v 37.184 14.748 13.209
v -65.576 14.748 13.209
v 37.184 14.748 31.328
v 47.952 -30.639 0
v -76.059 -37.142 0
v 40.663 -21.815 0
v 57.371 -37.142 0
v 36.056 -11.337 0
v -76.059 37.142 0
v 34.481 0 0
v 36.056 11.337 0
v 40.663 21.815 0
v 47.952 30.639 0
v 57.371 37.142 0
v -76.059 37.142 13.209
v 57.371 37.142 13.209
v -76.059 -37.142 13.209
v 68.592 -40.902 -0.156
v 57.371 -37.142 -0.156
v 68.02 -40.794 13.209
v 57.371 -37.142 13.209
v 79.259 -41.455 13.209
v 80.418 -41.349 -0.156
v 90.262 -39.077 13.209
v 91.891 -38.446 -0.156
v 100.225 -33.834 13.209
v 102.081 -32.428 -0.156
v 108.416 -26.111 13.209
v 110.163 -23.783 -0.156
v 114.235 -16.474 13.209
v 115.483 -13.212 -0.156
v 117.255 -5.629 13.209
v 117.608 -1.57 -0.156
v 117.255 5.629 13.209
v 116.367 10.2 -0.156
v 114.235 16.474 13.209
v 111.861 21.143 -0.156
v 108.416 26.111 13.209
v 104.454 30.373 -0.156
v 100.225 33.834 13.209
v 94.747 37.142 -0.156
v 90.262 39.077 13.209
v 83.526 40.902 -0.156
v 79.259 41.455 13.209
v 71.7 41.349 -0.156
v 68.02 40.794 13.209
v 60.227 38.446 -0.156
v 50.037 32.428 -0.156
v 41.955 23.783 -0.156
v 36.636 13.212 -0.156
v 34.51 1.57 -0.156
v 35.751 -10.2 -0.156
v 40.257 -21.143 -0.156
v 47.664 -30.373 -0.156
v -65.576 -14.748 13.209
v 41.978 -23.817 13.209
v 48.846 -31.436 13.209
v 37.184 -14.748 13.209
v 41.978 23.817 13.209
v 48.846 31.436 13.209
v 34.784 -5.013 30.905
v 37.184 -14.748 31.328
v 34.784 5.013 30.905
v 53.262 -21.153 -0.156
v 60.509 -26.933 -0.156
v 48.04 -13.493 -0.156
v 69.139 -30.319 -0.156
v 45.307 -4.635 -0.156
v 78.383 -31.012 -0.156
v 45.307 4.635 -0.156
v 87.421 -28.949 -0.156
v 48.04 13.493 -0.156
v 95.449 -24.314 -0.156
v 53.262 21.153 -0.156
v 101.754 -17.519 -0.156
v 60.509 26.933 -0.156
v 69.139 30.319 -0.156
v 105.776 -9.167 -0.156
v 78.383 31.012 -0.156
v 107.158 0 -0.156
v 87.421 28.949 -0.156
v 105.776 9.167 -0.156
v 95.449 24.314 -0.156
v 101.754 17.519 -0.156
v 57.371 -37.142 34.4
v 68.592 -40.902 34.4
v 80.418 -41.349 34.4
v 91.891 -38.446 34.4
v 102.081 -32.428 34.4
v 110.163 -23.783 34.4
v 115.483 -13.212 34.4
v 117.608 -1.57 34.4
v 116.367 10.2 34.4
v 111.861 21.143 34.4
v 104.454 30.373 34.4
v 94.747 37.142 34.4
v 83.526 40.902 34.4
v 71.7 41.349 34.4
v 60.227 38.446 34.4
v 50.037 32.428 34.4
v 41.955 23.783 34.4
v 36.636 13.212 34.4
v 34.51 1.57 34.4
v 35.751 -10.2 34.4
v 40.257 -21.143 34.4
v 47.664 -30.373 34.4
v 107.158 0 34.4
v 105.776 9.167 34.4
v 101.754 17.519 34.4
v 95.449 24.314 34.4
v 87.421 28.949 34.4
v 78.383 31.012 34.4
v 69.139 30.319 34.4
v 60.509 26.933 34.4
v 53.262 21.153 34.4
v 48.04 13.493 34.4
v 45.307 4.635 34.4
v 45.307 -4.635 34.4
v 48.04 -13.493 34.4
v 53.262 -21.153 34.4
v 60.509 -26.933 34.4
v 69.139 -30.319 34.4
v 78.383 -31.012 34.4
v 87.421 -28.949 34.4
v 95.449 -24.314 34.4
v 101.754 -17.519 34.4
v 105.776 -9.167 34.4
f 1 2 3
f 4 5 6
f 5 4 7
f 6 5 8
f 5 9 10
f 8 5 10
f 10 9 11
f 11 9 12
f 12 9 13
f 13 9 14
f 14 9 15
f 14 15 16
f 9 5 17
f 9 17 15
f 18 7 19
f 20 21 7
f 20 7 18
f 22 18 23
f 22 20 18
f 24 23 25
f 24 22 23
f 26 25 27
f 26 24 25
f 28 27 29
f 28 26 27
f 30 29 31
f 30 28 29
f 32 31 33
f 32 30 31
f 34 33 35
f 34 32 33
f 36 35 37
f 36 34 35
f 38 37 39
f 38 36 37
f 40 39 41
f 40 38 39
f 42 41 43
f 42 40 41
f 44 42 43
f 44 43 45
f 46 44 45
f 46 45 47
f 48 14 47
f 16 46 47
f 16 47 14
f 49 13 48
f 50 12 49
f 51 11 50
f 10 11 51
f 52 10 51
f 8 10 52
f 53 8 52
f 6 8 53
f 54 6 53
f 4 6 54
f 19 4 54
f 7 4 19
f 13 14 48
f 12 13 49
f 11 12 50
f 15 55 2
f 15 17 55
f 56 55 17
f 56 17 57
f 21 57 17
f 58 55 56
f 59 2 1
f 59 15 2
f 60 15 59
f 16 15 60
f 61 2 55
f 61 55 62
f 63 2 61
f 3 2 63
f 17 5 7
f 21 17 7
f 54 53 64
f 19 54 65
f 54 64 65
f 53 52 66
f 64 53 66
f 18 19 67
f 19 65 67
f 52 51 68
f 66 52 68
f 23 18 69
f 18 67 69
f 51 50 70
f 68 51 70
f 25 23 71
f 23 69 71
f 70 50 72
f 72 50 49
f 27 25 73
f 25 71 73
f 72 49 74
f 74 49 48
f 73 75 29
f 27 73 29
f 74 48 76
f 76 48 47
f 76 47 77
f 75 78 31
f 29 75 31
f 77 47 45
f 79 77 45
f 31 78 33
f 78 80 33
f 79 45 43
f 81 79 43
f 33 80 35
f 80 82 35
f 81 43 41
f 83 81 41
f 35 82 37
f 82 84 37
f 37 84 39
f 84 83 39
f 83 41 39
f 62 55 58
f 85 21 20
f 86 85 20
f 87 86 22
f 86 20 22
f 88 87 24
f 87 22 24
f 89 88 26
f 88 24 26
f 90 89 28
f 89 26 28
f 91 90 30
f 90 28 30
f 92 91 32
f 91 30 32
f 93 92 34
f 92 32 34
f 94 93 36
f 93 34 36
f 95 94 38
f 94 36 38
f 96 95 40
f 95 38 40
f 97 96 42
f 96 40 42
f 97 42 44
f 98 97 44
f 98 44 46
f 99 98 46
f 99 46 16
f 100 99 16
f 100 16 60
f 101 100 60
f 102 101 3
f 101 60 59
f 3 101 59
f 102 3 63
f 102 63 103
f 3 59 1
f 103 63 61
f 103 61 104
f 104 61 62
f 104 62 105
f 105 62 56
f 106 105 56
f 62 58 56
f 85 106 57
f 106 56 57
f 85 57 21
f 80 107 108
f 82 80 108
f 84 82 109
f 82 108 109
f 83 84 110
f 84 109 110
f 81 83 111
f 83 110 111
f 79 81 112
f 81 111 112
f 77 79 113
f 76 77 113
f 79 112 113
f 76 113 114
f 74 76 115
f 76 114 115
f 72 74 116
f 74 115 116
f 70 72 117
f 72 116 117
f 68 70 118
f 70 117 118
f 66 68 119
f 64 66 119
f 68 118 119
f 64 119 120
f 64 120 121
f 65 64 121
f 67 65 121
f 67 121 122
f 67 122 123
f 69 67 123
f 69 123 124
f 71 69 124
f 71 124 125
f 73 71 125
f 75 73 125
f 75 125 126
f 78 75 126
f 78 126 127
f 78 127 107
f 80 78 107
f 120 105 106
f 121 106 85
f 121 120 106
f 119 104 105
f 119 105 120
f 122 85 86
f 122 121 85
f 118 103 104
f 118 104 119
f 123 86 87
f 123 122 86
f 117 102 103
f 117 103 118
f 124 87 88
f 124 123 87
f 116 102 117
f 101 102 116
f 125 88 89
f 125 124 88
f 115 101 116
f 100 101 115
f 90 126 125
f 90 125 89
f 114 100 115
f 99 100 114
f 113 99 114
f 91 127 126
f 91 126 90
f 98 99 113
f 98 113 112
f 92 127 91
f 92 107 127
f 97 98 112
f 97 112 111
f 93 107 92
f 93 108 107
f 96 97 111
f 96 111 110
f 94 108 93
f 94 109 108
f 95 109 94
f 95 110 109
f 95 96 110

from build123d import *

# Parameters (mm, degrees)
F6_W        = 152.1180570126
F6_H        = 74.284017086
F0_DEPTH    = 13.2086668164
F1_DEPTH    = 13.3642852306
F2_W        = 151.2780189514
F2_H        = 29.4950902462
F8_DEPTH    = 20.6191111356
F3_T4_DEPTH = 689.5239445372
F4_DEPTH    = 34.5556028187
F5_R        = 31.0991112757
F9_DEPTH    = 34.5566028187


# Not quite as in the source:
# - a fillet or chamfer that OpenCascade refuses, or shapes differently, is made with other operations: its cross-section is extruded or revolved along the edge and cut away or added


with BuildPart() as f0:
    # F6 (on Top) → F0 (new body)
    with BuildSketch(Plane.XY):
        Rectangle(F6_W, F6_H)
    extrude(amount=F0_DEPTH)

    # F7 (on face) → F1 (join)
    with BuildSketch(Plane.XY.offset(13.2086668164)):
        with BuildLine():
            Line((76.0590285063, 37.142008543), (57.3713417563, 37.142008543))
            ThreePointArc((57.3713417563, 37.142008543), (34.4806875741, 0), (57.3713417563, -37.142008543))
            Line((57.3713417563, -37.142008543), (76.0590285063, -37.142008543))
            Line((76.0590285063, -37.142008543), (76.0590285063, 37.142008543))
        make_face()
        with BuildLine():
            ThreePointArc((57.3713417563, -37.142008543), (97.873650022, -35.396055187), (117.6373694385, 0))
            ThreePointArc((117.6373694385, 0), (97.873650022, 35.396055187), (57.3713417563, 37.142008543))
            Line((57.3713417563, 37.142008543), (76.0590285063, 37.142008543))
            Line((76.0590285063, 37.142008543), (76.0590285063, -37.142008543))
            Line((76.0590285063, -37.142008543), (57.3713417563, -37.142008543))
        make_face()
    extrude(amount=-F1_DEPTH)

    # F2 (on face) → F8 (join)
    with BuildSketch(Plane.XY.offset(13.2086668164)):
        Rectangle(F2_W, F2_H)
    extrude(amount=F8_DEPTH)

    # F3: chamfer of 127 x 22.39352655 on 1 edges, made by hand


with BuildPart() as f3_tool2:
    # F3_s3 → F3_t4 (new body)
    with BuildSketch(Plane.XZ.offset(-344.7619722686)):
        Polygon((-75.6390094757, 11.434251402), (51.3609905243, 33.827777952), (-75.6390094757, 33.827777952), align=None)
    extrude(amount=F3_T4_DEPTH)

    split(bisect_by=Plane.XY.offset(13.2086668164), keep=Keep.TOP)


with BuildPart() as f0_1:
    add(f0.part)

    # F3_t1: cut F3_tool2
    add(f3_tool2.part, mode=Mode.SUBTRACT)

    # F4 (add): a face of the model
    f4_faces = [f0_1.faces().sort_by_distance(p)[0] for p in [
        (76.0590285063, 0, -0.1556184143),
    ]]
    extrude(f4_faces, amount=-F4_DEPTH)

    # F5 (on face) → F9 (cut, through all)
    with BuildSketch(Plane.XY.offset(34.3999844044)):
        with Locations((76.0590285063, 0)):
            Circle(F5_R)
    extrude(amount=-F9_DEPTH, mode=Mode.SUBTRACT)


solid = f0_1.part
